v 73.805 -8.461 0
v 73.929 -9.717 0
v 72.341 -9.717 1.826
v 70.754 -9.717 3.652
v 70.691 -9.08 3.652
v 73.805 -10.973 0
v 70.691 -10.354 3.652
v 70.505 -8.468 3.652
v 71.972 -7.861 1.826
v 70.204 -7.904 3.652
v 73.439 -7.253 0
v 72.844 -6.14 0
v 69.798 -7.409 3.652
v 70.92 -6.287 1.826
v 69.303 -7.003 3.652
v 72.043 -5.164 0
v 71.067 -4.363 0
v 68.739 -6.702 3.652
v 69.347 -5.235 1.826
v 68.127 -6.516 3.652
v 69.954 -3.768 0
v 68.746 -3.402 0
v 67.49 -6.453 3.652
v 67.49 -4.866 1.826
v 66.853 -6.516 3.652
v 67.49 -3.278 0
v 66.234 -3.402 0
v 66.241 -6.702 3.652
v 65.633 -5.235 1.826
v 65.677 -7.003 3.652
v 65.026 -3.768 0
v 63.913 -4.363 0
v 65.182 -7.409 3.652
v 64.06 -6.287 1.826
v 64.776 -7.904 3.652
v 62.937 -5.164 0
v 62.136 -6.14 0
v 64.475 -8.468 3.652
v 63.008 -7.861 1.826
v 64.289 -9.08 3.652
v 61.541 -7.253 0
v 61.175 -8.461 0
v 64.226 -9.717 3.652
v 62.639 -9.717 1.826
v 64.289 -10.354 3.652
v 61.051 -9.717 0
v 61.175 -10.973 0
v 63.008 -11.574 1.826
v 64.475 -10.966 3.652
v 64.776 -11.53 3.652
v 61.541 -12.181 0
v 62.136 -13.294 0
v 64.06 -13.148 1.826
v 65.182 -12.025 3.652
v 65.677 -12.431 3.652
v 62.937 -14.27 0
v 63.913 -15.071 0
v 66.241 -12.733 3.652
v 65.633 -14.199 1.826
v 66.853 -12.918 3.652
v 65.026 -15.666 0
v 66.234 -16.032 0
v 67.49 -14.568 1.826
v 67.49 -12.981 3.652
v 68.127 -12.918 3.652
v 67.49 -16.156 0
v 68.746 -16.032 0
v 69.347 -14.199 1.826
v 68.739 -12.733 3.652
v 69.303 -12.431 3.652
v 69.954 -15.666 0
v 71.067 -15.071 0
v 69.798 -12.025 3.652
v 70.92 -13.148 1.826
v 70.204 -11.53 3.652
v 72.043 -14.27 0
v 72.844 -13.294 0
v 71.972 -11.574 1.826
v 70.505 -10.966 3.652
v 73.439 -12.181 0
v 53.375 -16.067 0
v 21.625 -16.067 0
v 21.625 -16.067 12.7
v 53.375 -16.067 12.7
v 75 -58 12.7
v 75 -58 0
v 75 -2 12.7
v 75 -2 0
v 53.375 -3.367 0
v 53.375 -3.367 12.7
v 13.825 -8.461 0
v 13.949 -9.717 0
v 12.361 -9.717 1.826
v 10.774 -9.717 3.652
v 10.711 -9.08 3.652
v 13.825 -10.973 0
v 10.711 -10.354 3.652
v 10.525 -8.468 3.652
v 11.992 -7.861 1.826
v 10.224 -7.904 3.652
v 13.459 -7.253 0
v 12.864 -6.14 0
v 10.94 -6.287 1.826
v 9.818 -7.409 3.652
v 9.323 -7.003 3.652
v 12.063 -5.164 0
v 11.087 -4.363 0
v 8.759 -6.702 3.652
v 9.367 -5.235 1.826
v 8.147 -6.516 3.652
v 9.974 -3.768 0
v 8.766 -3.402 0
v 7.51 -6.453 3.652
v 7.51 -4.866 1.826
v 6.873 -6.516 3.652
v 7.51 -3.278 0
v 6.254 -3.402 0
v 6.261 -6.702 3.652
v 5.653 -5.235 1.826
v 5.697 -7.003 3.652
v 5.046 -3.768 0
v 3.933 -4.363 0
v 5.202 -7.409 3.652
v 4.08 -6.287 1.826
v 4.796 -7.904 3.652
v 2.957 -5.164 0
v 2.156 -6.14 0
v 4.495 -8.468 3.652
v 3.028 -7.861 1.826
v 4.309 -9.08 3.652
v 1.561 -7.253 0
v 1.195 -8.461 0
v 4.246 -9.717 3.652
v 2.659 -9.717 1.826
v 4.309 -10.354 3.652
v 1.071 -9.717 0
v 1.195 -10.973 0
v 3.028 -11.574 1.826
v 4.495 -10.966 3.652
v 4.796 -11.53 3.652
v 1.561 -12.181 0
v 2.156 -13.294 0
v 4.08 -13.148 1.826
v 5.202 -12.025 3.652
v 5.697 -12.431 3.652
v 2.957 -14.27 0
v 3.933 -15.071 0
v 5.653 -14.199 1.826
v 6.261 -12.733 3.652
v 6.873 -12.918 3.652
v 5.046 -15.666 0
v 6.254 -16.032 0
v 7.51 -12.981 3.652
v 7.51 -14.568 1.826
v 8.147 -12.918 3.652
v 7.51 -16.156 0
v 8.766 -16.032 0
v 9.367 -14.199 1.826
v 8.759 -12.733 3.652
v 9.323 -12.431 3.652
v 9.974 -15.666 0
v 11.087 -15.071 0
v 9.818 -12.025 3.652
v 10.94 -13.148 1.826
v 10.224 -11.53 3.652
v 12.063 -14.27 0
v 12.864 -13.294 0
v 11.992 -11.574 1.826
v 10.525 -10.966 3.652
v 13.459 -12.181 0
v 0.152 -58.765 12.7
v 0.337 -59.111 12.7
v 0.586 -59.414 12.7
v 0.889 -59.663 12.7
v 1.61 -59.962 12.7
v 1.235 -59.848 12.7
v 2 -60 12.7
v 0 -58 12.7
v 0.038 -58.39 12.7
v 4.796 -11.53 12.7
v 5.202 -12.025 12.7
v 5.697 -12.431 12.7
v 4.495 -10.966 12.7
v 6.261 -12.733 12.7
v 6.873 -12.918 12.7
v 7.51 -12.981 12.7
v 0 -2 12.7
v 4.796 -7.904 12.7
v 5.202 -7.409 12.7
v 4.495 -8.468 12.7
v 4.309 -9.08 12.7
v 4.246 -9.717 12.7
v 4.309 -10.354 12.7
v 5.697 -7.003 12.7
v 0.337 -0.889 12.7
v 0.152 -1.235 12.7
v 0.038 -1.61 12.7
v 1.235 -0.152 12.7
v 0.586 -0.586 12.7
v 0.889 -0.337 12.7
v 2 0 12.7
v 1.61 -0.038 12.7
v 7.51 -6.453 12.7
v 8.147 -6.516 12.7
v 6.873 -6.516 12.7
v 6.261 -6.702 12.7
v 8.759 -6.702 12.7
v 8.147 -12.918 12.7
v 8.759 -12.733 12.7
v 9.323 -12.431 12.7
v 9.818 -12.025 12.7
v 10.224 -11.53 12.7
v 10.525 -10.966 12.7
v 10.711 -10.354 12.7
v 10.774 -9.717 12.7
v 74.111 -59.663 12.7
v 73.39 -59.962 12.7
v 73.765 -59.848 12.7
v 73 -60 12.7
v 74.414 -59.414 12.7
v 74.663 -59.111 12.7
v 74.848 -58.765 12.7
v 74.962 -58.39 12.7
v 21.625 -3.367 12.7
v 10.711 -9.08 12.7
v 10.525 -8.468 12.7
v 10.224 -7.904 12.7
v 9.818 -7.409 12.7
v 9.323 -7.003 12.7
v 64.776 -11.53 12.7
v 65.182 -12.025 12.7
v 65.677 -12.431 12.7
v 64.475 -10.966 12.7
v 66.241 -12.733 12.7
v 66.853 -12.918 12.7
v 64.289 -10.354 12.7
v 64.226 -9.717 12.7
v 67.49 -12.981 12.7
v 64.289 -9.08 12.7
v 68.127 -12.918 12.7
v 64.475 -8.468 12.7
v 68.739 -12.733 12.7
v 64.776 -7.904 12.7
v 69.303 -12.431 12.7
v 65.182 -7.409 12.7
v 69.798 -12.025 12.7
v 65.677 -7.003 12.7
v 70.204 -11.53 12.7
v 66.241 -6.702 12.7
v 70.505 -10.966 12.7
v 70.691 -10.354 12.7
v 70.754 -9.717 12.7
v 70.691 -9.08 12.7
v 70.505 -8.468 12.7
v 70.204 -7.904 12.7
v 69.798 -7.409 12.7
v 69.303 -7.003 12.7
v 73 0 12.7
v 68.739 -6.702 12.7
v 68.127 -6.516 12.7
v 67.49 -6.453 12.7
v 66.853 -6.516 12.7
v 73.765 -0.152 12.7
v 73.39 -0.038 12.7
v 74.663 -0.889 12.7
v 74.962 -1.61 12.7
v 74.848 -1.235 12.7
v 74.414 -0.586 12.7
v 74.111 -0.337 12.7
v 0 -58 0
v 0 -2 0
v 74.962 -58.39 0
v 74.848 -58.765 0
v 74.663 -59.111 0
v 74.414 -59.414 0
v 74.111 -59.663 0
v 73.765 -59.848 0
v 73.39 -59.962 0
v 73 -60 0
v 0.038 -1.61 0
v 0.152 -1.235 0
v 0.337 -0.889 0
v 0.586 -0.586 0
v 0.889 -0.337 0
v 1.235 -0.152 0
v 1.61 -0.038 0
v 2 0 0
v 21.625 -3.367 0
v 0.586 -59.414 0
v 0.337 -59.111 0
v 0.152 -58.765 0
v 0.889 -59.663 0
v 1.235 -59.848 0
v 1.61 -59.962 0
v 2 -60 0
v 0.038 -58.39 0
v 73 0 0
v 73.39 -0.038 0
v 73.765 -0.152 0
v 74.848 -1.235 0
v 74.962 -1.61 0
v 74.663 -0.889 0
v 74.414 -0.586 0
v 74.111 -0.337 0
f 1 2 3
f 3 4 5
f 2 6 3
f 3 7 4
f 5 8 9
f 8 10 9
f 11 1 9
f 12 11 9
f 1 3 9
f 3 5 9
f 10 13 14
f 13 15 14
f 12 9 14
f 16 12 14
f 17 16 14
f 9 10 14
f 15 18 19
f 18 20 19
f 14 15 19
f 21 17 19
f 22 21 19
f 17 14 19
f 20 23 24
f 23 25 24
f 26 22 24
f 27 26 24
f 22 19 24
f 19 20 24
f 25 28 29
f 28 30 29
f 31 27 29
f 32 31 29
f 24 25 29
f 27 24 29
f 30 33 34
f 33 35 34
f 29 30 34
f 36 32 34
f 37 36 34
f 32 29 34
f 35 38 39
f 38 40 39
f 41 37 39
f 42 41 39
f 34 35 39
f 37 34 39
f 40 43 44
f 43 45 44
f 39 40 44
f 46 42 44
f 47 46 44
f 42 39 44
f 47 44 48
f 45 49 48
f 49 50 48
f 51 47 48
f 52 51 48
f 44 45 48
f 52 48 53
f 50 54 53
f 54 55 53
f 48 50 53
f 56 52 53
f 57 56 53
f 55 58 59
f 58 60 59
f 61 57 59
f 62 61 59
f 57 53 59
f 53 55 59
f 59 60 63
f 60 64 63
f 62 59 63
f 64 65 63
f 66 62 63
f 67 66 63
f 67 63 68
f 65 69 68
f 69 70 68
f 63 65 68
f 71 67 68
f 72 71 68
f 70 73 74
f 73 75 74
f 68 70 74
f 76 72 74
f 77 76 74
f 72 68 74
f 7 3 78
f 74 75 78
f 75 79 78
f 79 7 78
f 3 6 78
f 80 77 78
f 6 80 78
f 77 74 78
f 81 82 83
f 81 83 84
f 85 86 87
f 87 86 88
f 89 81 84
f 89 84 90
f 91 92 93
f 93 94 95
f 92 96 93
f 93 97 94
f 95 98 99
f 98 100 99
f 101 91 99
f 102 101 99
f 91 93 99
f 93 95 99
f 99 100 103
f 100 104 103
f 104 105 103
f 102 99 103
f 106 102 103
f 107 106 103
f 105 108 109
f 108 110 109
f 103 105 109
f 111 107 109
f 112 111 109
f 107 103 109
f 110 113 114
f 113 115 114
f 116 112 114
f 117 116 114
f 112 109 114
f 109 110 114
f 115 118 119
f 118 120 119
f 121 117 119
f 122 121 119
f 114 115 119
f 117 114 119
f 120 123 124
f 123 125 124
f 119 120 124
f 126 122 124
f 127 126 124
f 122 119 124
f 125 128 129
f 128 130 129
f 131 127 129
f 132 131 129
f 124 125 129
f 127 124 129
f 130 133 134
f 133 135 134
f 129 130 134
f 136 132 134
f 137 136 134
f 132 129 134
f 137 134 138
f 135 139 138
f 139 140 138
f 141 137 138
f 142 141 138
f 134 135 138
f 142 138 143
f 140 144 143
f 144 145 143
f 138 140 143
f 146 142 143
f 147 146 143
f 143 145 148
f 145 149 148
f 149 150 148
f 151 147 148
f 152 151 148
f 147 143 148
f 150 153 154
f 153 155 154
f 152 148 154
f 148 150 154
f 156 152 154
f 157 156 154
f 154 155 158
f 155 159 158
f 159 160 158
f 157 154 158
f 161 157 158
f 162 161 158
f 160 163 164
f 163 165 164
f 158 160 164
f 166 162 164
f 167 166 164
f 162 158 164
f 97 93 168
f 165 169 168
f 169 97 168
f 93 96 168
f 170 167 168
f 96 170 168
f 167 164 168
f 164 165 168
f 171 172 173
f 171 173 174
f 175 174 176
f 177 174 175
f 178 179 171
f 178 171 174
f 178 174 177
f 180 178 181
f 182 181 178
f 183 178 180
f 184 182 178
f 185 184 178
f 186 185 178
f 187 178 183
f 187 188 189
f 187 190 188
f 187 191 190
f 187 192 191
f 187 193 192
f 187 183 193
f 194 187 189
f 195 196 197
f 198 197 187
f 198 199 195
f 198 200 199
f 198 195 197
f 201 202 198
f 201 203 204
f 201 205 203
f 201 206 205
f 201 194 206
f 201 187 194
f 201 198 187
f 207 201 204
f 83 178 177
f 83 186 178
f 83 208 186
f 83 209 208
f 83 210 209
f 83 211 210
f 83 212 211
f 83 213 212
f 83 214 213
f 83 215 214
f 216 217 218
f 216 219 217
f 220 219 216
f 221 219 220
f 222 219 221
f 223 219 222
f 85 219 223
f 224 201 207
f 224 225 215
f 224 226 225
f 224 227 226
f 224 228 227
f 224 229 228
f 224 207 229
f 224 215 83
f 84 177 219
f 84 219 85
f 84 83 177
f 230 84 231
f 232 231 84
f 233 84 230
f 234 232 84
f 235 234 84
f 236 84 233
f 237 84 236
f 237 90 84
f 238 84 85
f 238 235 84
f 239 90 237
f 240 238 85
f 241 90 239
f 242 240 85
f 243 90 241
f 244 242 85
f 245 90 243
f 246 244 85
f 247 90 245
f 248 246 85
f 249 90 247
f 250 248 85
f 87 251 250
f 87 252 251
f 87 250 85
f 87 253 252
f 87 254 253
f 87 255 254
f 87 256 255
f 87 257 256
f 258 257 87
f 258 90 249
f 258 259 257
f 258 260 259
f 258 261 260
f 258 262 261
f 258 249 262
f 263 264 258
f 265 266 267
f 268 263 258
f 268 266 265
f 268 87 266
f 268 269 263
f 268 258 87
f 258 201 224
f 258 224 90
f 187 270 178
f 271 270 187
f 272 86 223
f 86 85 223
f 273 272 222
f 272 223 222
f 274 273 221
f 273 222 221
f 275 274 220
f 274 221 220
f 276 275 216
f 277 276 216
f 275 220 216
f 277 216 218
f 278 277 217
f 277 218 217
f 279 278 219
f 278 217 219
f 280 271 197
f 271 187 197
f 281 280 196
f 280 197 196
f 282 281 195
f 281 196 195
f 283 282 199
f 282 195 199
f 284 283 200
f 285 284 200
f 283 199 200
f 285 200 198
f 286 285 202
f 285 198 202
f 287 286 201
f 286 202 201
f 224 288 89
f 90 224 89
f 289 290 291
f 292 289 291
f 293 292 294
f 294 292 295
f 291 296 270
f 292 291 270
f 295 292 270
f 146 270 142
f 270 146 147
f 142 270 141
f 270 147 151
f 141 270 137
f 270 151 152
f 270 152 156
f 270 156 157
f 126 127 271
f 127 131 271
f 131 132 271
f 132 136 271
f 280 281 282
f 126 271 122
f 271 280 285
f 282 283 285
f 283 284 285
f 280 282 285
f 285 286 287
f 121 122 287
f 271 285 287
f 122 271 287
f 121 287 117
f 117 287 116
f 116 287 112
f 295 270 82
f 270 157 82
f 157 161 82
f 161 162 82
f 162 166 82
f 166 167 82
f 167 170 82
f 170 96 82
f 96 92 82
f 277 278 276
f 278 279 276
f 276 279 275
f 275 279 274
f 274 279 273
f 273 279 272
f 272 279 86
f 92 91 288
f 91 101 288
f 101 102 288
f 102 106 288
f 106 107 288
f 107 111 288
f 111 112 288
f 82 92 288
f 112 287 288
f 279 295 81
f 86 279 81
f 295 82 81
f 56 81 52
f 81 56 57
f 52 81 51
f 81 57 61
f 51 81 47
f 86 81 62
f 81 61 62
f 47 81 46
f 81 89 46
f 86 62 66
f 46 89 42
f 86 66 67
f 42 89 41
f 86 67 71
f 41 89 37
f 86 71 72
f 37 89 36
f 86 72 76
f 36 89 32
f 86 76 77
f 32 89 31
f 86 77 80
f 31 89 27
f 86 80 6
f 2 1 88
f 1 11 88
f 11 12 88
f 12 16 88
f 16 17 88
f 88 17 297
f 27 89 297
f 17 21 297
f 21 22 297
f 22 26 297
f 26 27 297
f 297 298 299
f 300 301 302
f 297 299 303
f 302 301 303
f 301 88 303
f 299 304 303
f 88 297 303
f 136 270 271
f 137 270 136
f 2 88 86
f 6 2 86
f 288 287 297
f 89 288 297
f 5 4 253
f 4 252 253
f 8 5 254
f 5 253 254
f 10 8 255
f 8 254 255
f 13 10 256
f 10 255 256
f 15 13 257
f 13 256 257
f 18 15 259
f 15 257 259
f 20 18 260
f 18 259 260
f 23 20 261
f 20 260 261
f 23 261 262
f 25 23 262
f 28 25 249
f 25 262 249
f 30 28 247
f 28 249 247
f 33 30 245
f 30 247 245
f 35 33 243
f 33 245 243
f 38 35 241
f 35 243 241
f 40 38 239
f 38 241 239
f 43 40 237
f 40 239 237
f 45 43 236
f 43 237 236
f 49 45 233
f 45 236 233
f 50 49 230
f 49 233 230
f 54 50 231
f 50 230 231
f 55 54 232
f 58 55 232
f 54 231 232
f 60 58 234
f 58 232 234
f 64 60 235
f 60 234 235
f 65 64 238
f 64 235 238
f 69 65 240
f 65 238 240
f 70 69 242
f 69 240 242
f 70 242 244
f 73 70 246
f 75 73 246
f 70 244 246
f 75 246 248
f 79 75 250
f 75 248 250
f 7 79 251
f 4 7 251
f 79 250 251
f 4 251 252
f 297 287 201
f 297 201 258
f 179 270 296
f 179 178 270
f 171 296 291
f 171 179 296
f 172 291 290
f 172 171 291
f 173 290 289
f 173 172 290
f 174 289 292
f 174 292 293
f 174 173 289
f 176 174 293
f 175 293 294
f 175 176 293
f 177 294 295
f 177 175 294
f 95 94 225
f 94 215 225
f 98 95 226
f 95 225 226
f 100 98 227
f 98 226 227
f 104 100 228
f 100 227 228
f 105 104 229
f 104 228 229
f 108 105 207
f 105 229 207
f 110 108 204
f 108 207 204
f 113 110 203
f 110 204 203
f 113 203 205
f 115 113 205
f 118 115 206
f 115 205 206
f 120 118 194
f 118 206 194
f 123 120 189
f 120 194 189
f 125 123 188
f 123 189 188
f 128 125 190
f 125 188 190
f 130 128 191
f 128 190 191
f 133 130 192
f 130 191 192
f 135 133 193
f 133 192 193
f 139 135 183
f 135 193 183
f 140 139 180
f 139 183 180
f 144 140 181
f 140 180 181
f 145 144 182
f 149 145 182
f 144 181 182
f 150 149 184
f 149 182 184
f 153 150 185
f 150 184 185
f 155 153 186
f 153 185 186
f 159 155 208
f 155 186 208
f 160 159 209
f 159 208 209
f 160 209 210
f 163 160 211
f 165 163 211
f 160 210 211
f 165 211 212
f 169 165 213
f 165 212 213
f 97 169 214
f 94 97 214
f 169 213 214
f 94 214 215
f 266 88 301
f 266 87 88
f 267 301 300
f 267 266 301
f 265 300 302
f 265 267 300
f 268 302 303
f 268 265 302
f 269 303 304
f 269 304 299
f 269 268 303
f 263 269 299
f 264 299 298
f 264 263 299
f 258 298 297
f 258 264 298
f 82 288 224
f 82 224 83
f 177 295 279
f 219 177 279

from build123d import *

# Parameters (mm, degrees)
SKETCH1_W                                        = 75
SKETCH1_H                                        = 60
BOSS_EXTRUDE1_DEPTH                              = 12.7
CSK_FOR_1_4_FLAT_HEAD_MACHINE_SCREW1_D           = 6.5278
CSK_FOR_1_4_FLAT_HEAD_MACHINE_SCREW1_CSINK_D     = 12.8778
CSK_FOR_1_4_FLAT_HEAD_MACHINE_SCREW1_CSINK_ANGLE = 82
FILLET1_R                                        = 2


with BuildPart() as part:
    # Sketch1 → Boss-Extrude1 (new body)
    with BuildSketch(Plane.XY):
        with Locations((37.5, -30)):
            Rectangle(SKETCH1_W, SKETCH1_H)
        Polygon((21.625, -3.367091904), (21.625, -16.067091904), (53.375, -16.067091904), (53.375, -3.367091904), (37.5, -3.367091904), align=None, mode=Mode.SUBTRACT)
    extrude(amount=BOSS_EXTRUDE1_DEPTH)

    # CSK for 1/4 Flat Head Machine Screw1 (through all)
    with Locations(Plane(origin=(0, 0, 0), x_dir=(-1, 0, 0), z_dir=(0, 0, -1))):
        with Locations((-67.49, -9.717091904), (-7.51, -9.717091904)):
            CounterSinkHole(CSK_FOR_1_4_FLAT_HEAD_MACHINE_SCREW1_D / 2, CSK_FOR_1_4_FLAT_HEAD_MACHINE_SCREW1_CSINK_D / 2, counter_sink_angle=CSK_FOR_1_4_FLAT_HEAD_MACHINE_SCREW1_CSINK_ANGLE)

    # Fillet1
    fillet1_edges = [part.edges().sort_by_distance(p)[0] for p in [
        (0, 0, 6.35),
        (75, 0, 6.35),
        (75, -60, 6.35),
        (0, -60, 6.35),
    ]]
    fillet(fillet1_edges, radius=FILLET1_R)


solid = part.part
